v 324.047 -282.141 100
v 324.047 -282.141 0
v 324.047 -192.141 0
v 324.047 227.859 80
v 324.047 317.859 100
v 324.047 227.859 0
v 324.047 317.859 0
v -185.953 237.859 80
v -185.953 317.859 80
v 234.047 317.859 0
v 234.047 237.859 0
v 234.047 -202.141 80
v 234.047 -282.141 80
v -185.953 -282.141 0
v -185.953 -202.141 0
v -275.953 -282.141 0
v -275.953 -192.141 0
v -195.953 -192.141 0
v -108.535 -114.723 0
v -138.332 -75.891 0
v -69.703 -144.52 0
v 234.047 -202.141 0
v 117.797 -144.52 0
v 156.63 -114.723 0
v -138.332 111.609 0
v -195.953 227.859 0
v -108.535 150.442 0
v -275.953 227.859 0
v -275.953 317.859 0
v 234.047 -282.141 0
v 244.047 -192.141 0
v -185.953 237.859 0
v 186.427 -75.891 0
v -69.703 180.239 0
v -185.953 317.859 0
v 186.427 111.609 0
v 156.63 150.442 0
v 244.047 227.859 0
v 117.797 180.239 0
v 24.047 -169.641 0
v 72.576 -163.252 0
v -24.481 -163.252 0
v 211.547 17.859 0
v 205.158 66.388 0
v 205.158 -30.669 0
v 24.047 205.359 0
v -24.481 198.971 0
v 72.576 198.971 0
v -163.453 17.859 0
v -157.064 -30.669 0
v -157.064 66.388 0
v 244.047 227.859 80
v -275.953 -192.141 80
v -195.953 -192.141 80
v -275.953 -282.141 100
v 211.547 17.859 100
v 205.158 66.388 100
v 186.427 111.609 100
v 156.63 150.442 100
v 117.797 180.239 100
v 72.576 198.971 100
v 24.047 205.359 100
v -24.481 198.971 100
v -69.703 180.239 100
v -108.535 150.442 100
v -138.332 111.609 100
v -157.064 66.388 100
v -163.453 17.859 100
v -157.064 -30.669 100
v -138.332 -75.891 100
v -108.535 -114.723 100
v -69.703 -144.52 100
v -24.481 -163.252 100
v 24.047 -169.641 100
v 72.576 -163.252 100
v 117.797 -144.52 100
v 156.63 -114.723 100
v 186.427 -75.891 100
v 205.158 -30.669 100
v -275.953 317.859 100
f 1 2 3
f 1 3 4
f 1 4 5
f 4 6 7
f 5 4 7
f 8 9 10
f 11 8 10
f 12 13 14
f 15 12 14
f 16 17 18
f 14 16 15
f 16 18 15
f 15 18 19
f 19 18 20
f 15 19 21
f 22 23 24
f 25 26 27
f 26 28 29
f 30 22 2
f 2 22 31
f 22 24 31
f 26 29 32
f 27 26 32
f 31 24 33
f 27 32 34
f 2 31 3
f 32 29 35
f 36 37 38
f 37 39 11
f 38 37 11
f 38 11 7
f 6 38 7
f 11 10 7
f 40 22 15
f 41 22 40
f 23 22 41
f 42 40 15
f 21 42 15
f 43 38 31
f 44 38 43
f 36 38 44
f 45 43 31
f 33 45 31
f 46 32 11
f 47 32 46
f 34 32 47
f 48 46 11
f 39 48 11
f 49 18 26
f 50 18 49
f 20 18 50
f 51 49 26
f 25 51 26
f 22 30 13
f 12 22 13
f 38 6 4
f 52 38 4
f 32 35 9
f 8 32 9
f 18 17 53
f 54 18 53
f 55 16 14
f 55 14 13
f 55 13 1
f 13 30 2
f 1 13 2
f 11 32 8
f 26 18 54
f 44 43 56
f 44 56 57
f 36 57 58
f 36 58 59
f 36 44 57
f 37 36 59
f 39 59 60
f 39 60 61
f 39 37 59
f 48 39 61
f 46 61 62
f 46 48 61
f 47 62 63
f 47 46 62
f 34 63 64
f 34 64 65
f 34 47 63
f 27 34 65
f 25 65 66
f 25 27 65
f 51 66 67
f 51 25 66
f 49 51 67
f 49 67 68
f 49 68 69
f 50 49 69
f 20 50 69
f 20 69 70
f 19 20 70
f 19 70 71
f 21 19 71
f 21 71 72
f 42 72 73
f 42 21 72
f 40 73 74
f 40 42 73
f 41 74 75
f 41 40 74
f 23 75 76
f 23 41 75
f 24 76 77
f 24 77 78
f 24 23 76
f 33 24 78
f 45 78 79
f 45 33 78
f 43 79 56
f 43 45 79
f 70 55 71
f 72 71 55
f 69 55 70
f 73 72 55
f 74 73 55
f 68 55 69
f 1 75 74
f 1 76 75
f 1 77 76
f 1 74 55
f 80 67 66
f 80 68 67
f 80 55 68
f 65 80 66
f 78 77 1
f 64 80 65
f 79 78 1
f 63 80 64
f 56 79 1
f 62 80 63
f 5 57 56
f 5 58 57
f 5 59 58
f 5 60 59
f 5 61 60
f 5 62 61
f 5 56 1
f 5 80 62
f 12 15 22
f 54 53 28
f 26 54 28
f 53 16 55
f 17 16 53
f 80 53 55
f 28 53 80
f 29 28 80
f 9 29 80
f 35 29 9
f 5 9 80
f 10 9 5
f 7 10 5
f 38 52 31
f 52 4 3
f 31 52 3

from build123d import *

# Parameters (mm, degrees)
CROQUIS1_W              = 600
CROQUIS1_H              = 600
CROQUIS1_R              = 187.5
SALIENTE_EXTRUIR1_DEPTH = 100
CORTAR_EXTRUIR6_DEPTH   = 80
CORTAR_EXTRUIR7_DEPTH   = 80
CORTAR_EXTRUIR8_DEPTH   = 80
CORTAR_EXTRUIR9_DEPTH   = 80


with BuildPart() as part:
    # Croquis1 → Saliente-Extruir1 (new body)
    with BuildSketch(Plane.XY):
        with Locations((24.047372846, 17.859468054)):
            Rectangle(CROQUIS1_W, CROQUIS1_H)
        with Locations((24.047372846, 17.859468054)):
            Circle(CROQUIS1_R, mode=Mode.SUBTRACT)
    extrude(amount=SALIENTE_EXTRUIR1_DEPTH)

    # Croquis2 → Cortar-Extruir6 (cut)
    with BuildSketch(Plane.ZY.offset(275.952627154)):
        Polygon((80, -192.140531946), (0, 227.859468054), (0, -192.140531946), align=None)
    extrude(amount=-CORTAR_EXTRUIR6_DEPTH, mode=Mode.SUBTRACT)

    # Croquis3 → Cortar-Extruir7 (cut)
    with BuildSketch(Plane.XZ.offset(282.140531946)):
        Polygon((234.047372846, 80), (-185.952627154, 0), (234.047372846, 0), align=None)
    extrude(amount=-CORTAR_EXTRUIR7_DEPTH, mode=Mode.SUBTRACT)

    # Croquis4 → Cortar-Extruir8 (cut)
    with BuildSketch(Plane(origin=(324.047372846, 0, 0), x_dir=(0, 0, -1), z_dir=(1, 0, 0))):
        Polygon((-80, 227.859468054), (0, -192.140531946), (0, 227.859468054), align=None)
    extrude(amount=-CORTAR_EXTRUIR8_DEPTH, mode=Mode.SUBTRACT)

    # Croquis6 → Cortar-Extruir9 (cut)
    with BuildSketch(Plane(origin=(0, 317.859468054, 0), x_dir=(1, 0, 0), z_dir=(0, 1, 0))):
        Polygon((234.047372846, 0), (-185.952627154, 0), (-185.952627154, -80), align=None)
    extrude(amount=-CORTAR_EXTRUIR9_DEPTH, mode=Mode.SUBTRACT)


solid = part.part
